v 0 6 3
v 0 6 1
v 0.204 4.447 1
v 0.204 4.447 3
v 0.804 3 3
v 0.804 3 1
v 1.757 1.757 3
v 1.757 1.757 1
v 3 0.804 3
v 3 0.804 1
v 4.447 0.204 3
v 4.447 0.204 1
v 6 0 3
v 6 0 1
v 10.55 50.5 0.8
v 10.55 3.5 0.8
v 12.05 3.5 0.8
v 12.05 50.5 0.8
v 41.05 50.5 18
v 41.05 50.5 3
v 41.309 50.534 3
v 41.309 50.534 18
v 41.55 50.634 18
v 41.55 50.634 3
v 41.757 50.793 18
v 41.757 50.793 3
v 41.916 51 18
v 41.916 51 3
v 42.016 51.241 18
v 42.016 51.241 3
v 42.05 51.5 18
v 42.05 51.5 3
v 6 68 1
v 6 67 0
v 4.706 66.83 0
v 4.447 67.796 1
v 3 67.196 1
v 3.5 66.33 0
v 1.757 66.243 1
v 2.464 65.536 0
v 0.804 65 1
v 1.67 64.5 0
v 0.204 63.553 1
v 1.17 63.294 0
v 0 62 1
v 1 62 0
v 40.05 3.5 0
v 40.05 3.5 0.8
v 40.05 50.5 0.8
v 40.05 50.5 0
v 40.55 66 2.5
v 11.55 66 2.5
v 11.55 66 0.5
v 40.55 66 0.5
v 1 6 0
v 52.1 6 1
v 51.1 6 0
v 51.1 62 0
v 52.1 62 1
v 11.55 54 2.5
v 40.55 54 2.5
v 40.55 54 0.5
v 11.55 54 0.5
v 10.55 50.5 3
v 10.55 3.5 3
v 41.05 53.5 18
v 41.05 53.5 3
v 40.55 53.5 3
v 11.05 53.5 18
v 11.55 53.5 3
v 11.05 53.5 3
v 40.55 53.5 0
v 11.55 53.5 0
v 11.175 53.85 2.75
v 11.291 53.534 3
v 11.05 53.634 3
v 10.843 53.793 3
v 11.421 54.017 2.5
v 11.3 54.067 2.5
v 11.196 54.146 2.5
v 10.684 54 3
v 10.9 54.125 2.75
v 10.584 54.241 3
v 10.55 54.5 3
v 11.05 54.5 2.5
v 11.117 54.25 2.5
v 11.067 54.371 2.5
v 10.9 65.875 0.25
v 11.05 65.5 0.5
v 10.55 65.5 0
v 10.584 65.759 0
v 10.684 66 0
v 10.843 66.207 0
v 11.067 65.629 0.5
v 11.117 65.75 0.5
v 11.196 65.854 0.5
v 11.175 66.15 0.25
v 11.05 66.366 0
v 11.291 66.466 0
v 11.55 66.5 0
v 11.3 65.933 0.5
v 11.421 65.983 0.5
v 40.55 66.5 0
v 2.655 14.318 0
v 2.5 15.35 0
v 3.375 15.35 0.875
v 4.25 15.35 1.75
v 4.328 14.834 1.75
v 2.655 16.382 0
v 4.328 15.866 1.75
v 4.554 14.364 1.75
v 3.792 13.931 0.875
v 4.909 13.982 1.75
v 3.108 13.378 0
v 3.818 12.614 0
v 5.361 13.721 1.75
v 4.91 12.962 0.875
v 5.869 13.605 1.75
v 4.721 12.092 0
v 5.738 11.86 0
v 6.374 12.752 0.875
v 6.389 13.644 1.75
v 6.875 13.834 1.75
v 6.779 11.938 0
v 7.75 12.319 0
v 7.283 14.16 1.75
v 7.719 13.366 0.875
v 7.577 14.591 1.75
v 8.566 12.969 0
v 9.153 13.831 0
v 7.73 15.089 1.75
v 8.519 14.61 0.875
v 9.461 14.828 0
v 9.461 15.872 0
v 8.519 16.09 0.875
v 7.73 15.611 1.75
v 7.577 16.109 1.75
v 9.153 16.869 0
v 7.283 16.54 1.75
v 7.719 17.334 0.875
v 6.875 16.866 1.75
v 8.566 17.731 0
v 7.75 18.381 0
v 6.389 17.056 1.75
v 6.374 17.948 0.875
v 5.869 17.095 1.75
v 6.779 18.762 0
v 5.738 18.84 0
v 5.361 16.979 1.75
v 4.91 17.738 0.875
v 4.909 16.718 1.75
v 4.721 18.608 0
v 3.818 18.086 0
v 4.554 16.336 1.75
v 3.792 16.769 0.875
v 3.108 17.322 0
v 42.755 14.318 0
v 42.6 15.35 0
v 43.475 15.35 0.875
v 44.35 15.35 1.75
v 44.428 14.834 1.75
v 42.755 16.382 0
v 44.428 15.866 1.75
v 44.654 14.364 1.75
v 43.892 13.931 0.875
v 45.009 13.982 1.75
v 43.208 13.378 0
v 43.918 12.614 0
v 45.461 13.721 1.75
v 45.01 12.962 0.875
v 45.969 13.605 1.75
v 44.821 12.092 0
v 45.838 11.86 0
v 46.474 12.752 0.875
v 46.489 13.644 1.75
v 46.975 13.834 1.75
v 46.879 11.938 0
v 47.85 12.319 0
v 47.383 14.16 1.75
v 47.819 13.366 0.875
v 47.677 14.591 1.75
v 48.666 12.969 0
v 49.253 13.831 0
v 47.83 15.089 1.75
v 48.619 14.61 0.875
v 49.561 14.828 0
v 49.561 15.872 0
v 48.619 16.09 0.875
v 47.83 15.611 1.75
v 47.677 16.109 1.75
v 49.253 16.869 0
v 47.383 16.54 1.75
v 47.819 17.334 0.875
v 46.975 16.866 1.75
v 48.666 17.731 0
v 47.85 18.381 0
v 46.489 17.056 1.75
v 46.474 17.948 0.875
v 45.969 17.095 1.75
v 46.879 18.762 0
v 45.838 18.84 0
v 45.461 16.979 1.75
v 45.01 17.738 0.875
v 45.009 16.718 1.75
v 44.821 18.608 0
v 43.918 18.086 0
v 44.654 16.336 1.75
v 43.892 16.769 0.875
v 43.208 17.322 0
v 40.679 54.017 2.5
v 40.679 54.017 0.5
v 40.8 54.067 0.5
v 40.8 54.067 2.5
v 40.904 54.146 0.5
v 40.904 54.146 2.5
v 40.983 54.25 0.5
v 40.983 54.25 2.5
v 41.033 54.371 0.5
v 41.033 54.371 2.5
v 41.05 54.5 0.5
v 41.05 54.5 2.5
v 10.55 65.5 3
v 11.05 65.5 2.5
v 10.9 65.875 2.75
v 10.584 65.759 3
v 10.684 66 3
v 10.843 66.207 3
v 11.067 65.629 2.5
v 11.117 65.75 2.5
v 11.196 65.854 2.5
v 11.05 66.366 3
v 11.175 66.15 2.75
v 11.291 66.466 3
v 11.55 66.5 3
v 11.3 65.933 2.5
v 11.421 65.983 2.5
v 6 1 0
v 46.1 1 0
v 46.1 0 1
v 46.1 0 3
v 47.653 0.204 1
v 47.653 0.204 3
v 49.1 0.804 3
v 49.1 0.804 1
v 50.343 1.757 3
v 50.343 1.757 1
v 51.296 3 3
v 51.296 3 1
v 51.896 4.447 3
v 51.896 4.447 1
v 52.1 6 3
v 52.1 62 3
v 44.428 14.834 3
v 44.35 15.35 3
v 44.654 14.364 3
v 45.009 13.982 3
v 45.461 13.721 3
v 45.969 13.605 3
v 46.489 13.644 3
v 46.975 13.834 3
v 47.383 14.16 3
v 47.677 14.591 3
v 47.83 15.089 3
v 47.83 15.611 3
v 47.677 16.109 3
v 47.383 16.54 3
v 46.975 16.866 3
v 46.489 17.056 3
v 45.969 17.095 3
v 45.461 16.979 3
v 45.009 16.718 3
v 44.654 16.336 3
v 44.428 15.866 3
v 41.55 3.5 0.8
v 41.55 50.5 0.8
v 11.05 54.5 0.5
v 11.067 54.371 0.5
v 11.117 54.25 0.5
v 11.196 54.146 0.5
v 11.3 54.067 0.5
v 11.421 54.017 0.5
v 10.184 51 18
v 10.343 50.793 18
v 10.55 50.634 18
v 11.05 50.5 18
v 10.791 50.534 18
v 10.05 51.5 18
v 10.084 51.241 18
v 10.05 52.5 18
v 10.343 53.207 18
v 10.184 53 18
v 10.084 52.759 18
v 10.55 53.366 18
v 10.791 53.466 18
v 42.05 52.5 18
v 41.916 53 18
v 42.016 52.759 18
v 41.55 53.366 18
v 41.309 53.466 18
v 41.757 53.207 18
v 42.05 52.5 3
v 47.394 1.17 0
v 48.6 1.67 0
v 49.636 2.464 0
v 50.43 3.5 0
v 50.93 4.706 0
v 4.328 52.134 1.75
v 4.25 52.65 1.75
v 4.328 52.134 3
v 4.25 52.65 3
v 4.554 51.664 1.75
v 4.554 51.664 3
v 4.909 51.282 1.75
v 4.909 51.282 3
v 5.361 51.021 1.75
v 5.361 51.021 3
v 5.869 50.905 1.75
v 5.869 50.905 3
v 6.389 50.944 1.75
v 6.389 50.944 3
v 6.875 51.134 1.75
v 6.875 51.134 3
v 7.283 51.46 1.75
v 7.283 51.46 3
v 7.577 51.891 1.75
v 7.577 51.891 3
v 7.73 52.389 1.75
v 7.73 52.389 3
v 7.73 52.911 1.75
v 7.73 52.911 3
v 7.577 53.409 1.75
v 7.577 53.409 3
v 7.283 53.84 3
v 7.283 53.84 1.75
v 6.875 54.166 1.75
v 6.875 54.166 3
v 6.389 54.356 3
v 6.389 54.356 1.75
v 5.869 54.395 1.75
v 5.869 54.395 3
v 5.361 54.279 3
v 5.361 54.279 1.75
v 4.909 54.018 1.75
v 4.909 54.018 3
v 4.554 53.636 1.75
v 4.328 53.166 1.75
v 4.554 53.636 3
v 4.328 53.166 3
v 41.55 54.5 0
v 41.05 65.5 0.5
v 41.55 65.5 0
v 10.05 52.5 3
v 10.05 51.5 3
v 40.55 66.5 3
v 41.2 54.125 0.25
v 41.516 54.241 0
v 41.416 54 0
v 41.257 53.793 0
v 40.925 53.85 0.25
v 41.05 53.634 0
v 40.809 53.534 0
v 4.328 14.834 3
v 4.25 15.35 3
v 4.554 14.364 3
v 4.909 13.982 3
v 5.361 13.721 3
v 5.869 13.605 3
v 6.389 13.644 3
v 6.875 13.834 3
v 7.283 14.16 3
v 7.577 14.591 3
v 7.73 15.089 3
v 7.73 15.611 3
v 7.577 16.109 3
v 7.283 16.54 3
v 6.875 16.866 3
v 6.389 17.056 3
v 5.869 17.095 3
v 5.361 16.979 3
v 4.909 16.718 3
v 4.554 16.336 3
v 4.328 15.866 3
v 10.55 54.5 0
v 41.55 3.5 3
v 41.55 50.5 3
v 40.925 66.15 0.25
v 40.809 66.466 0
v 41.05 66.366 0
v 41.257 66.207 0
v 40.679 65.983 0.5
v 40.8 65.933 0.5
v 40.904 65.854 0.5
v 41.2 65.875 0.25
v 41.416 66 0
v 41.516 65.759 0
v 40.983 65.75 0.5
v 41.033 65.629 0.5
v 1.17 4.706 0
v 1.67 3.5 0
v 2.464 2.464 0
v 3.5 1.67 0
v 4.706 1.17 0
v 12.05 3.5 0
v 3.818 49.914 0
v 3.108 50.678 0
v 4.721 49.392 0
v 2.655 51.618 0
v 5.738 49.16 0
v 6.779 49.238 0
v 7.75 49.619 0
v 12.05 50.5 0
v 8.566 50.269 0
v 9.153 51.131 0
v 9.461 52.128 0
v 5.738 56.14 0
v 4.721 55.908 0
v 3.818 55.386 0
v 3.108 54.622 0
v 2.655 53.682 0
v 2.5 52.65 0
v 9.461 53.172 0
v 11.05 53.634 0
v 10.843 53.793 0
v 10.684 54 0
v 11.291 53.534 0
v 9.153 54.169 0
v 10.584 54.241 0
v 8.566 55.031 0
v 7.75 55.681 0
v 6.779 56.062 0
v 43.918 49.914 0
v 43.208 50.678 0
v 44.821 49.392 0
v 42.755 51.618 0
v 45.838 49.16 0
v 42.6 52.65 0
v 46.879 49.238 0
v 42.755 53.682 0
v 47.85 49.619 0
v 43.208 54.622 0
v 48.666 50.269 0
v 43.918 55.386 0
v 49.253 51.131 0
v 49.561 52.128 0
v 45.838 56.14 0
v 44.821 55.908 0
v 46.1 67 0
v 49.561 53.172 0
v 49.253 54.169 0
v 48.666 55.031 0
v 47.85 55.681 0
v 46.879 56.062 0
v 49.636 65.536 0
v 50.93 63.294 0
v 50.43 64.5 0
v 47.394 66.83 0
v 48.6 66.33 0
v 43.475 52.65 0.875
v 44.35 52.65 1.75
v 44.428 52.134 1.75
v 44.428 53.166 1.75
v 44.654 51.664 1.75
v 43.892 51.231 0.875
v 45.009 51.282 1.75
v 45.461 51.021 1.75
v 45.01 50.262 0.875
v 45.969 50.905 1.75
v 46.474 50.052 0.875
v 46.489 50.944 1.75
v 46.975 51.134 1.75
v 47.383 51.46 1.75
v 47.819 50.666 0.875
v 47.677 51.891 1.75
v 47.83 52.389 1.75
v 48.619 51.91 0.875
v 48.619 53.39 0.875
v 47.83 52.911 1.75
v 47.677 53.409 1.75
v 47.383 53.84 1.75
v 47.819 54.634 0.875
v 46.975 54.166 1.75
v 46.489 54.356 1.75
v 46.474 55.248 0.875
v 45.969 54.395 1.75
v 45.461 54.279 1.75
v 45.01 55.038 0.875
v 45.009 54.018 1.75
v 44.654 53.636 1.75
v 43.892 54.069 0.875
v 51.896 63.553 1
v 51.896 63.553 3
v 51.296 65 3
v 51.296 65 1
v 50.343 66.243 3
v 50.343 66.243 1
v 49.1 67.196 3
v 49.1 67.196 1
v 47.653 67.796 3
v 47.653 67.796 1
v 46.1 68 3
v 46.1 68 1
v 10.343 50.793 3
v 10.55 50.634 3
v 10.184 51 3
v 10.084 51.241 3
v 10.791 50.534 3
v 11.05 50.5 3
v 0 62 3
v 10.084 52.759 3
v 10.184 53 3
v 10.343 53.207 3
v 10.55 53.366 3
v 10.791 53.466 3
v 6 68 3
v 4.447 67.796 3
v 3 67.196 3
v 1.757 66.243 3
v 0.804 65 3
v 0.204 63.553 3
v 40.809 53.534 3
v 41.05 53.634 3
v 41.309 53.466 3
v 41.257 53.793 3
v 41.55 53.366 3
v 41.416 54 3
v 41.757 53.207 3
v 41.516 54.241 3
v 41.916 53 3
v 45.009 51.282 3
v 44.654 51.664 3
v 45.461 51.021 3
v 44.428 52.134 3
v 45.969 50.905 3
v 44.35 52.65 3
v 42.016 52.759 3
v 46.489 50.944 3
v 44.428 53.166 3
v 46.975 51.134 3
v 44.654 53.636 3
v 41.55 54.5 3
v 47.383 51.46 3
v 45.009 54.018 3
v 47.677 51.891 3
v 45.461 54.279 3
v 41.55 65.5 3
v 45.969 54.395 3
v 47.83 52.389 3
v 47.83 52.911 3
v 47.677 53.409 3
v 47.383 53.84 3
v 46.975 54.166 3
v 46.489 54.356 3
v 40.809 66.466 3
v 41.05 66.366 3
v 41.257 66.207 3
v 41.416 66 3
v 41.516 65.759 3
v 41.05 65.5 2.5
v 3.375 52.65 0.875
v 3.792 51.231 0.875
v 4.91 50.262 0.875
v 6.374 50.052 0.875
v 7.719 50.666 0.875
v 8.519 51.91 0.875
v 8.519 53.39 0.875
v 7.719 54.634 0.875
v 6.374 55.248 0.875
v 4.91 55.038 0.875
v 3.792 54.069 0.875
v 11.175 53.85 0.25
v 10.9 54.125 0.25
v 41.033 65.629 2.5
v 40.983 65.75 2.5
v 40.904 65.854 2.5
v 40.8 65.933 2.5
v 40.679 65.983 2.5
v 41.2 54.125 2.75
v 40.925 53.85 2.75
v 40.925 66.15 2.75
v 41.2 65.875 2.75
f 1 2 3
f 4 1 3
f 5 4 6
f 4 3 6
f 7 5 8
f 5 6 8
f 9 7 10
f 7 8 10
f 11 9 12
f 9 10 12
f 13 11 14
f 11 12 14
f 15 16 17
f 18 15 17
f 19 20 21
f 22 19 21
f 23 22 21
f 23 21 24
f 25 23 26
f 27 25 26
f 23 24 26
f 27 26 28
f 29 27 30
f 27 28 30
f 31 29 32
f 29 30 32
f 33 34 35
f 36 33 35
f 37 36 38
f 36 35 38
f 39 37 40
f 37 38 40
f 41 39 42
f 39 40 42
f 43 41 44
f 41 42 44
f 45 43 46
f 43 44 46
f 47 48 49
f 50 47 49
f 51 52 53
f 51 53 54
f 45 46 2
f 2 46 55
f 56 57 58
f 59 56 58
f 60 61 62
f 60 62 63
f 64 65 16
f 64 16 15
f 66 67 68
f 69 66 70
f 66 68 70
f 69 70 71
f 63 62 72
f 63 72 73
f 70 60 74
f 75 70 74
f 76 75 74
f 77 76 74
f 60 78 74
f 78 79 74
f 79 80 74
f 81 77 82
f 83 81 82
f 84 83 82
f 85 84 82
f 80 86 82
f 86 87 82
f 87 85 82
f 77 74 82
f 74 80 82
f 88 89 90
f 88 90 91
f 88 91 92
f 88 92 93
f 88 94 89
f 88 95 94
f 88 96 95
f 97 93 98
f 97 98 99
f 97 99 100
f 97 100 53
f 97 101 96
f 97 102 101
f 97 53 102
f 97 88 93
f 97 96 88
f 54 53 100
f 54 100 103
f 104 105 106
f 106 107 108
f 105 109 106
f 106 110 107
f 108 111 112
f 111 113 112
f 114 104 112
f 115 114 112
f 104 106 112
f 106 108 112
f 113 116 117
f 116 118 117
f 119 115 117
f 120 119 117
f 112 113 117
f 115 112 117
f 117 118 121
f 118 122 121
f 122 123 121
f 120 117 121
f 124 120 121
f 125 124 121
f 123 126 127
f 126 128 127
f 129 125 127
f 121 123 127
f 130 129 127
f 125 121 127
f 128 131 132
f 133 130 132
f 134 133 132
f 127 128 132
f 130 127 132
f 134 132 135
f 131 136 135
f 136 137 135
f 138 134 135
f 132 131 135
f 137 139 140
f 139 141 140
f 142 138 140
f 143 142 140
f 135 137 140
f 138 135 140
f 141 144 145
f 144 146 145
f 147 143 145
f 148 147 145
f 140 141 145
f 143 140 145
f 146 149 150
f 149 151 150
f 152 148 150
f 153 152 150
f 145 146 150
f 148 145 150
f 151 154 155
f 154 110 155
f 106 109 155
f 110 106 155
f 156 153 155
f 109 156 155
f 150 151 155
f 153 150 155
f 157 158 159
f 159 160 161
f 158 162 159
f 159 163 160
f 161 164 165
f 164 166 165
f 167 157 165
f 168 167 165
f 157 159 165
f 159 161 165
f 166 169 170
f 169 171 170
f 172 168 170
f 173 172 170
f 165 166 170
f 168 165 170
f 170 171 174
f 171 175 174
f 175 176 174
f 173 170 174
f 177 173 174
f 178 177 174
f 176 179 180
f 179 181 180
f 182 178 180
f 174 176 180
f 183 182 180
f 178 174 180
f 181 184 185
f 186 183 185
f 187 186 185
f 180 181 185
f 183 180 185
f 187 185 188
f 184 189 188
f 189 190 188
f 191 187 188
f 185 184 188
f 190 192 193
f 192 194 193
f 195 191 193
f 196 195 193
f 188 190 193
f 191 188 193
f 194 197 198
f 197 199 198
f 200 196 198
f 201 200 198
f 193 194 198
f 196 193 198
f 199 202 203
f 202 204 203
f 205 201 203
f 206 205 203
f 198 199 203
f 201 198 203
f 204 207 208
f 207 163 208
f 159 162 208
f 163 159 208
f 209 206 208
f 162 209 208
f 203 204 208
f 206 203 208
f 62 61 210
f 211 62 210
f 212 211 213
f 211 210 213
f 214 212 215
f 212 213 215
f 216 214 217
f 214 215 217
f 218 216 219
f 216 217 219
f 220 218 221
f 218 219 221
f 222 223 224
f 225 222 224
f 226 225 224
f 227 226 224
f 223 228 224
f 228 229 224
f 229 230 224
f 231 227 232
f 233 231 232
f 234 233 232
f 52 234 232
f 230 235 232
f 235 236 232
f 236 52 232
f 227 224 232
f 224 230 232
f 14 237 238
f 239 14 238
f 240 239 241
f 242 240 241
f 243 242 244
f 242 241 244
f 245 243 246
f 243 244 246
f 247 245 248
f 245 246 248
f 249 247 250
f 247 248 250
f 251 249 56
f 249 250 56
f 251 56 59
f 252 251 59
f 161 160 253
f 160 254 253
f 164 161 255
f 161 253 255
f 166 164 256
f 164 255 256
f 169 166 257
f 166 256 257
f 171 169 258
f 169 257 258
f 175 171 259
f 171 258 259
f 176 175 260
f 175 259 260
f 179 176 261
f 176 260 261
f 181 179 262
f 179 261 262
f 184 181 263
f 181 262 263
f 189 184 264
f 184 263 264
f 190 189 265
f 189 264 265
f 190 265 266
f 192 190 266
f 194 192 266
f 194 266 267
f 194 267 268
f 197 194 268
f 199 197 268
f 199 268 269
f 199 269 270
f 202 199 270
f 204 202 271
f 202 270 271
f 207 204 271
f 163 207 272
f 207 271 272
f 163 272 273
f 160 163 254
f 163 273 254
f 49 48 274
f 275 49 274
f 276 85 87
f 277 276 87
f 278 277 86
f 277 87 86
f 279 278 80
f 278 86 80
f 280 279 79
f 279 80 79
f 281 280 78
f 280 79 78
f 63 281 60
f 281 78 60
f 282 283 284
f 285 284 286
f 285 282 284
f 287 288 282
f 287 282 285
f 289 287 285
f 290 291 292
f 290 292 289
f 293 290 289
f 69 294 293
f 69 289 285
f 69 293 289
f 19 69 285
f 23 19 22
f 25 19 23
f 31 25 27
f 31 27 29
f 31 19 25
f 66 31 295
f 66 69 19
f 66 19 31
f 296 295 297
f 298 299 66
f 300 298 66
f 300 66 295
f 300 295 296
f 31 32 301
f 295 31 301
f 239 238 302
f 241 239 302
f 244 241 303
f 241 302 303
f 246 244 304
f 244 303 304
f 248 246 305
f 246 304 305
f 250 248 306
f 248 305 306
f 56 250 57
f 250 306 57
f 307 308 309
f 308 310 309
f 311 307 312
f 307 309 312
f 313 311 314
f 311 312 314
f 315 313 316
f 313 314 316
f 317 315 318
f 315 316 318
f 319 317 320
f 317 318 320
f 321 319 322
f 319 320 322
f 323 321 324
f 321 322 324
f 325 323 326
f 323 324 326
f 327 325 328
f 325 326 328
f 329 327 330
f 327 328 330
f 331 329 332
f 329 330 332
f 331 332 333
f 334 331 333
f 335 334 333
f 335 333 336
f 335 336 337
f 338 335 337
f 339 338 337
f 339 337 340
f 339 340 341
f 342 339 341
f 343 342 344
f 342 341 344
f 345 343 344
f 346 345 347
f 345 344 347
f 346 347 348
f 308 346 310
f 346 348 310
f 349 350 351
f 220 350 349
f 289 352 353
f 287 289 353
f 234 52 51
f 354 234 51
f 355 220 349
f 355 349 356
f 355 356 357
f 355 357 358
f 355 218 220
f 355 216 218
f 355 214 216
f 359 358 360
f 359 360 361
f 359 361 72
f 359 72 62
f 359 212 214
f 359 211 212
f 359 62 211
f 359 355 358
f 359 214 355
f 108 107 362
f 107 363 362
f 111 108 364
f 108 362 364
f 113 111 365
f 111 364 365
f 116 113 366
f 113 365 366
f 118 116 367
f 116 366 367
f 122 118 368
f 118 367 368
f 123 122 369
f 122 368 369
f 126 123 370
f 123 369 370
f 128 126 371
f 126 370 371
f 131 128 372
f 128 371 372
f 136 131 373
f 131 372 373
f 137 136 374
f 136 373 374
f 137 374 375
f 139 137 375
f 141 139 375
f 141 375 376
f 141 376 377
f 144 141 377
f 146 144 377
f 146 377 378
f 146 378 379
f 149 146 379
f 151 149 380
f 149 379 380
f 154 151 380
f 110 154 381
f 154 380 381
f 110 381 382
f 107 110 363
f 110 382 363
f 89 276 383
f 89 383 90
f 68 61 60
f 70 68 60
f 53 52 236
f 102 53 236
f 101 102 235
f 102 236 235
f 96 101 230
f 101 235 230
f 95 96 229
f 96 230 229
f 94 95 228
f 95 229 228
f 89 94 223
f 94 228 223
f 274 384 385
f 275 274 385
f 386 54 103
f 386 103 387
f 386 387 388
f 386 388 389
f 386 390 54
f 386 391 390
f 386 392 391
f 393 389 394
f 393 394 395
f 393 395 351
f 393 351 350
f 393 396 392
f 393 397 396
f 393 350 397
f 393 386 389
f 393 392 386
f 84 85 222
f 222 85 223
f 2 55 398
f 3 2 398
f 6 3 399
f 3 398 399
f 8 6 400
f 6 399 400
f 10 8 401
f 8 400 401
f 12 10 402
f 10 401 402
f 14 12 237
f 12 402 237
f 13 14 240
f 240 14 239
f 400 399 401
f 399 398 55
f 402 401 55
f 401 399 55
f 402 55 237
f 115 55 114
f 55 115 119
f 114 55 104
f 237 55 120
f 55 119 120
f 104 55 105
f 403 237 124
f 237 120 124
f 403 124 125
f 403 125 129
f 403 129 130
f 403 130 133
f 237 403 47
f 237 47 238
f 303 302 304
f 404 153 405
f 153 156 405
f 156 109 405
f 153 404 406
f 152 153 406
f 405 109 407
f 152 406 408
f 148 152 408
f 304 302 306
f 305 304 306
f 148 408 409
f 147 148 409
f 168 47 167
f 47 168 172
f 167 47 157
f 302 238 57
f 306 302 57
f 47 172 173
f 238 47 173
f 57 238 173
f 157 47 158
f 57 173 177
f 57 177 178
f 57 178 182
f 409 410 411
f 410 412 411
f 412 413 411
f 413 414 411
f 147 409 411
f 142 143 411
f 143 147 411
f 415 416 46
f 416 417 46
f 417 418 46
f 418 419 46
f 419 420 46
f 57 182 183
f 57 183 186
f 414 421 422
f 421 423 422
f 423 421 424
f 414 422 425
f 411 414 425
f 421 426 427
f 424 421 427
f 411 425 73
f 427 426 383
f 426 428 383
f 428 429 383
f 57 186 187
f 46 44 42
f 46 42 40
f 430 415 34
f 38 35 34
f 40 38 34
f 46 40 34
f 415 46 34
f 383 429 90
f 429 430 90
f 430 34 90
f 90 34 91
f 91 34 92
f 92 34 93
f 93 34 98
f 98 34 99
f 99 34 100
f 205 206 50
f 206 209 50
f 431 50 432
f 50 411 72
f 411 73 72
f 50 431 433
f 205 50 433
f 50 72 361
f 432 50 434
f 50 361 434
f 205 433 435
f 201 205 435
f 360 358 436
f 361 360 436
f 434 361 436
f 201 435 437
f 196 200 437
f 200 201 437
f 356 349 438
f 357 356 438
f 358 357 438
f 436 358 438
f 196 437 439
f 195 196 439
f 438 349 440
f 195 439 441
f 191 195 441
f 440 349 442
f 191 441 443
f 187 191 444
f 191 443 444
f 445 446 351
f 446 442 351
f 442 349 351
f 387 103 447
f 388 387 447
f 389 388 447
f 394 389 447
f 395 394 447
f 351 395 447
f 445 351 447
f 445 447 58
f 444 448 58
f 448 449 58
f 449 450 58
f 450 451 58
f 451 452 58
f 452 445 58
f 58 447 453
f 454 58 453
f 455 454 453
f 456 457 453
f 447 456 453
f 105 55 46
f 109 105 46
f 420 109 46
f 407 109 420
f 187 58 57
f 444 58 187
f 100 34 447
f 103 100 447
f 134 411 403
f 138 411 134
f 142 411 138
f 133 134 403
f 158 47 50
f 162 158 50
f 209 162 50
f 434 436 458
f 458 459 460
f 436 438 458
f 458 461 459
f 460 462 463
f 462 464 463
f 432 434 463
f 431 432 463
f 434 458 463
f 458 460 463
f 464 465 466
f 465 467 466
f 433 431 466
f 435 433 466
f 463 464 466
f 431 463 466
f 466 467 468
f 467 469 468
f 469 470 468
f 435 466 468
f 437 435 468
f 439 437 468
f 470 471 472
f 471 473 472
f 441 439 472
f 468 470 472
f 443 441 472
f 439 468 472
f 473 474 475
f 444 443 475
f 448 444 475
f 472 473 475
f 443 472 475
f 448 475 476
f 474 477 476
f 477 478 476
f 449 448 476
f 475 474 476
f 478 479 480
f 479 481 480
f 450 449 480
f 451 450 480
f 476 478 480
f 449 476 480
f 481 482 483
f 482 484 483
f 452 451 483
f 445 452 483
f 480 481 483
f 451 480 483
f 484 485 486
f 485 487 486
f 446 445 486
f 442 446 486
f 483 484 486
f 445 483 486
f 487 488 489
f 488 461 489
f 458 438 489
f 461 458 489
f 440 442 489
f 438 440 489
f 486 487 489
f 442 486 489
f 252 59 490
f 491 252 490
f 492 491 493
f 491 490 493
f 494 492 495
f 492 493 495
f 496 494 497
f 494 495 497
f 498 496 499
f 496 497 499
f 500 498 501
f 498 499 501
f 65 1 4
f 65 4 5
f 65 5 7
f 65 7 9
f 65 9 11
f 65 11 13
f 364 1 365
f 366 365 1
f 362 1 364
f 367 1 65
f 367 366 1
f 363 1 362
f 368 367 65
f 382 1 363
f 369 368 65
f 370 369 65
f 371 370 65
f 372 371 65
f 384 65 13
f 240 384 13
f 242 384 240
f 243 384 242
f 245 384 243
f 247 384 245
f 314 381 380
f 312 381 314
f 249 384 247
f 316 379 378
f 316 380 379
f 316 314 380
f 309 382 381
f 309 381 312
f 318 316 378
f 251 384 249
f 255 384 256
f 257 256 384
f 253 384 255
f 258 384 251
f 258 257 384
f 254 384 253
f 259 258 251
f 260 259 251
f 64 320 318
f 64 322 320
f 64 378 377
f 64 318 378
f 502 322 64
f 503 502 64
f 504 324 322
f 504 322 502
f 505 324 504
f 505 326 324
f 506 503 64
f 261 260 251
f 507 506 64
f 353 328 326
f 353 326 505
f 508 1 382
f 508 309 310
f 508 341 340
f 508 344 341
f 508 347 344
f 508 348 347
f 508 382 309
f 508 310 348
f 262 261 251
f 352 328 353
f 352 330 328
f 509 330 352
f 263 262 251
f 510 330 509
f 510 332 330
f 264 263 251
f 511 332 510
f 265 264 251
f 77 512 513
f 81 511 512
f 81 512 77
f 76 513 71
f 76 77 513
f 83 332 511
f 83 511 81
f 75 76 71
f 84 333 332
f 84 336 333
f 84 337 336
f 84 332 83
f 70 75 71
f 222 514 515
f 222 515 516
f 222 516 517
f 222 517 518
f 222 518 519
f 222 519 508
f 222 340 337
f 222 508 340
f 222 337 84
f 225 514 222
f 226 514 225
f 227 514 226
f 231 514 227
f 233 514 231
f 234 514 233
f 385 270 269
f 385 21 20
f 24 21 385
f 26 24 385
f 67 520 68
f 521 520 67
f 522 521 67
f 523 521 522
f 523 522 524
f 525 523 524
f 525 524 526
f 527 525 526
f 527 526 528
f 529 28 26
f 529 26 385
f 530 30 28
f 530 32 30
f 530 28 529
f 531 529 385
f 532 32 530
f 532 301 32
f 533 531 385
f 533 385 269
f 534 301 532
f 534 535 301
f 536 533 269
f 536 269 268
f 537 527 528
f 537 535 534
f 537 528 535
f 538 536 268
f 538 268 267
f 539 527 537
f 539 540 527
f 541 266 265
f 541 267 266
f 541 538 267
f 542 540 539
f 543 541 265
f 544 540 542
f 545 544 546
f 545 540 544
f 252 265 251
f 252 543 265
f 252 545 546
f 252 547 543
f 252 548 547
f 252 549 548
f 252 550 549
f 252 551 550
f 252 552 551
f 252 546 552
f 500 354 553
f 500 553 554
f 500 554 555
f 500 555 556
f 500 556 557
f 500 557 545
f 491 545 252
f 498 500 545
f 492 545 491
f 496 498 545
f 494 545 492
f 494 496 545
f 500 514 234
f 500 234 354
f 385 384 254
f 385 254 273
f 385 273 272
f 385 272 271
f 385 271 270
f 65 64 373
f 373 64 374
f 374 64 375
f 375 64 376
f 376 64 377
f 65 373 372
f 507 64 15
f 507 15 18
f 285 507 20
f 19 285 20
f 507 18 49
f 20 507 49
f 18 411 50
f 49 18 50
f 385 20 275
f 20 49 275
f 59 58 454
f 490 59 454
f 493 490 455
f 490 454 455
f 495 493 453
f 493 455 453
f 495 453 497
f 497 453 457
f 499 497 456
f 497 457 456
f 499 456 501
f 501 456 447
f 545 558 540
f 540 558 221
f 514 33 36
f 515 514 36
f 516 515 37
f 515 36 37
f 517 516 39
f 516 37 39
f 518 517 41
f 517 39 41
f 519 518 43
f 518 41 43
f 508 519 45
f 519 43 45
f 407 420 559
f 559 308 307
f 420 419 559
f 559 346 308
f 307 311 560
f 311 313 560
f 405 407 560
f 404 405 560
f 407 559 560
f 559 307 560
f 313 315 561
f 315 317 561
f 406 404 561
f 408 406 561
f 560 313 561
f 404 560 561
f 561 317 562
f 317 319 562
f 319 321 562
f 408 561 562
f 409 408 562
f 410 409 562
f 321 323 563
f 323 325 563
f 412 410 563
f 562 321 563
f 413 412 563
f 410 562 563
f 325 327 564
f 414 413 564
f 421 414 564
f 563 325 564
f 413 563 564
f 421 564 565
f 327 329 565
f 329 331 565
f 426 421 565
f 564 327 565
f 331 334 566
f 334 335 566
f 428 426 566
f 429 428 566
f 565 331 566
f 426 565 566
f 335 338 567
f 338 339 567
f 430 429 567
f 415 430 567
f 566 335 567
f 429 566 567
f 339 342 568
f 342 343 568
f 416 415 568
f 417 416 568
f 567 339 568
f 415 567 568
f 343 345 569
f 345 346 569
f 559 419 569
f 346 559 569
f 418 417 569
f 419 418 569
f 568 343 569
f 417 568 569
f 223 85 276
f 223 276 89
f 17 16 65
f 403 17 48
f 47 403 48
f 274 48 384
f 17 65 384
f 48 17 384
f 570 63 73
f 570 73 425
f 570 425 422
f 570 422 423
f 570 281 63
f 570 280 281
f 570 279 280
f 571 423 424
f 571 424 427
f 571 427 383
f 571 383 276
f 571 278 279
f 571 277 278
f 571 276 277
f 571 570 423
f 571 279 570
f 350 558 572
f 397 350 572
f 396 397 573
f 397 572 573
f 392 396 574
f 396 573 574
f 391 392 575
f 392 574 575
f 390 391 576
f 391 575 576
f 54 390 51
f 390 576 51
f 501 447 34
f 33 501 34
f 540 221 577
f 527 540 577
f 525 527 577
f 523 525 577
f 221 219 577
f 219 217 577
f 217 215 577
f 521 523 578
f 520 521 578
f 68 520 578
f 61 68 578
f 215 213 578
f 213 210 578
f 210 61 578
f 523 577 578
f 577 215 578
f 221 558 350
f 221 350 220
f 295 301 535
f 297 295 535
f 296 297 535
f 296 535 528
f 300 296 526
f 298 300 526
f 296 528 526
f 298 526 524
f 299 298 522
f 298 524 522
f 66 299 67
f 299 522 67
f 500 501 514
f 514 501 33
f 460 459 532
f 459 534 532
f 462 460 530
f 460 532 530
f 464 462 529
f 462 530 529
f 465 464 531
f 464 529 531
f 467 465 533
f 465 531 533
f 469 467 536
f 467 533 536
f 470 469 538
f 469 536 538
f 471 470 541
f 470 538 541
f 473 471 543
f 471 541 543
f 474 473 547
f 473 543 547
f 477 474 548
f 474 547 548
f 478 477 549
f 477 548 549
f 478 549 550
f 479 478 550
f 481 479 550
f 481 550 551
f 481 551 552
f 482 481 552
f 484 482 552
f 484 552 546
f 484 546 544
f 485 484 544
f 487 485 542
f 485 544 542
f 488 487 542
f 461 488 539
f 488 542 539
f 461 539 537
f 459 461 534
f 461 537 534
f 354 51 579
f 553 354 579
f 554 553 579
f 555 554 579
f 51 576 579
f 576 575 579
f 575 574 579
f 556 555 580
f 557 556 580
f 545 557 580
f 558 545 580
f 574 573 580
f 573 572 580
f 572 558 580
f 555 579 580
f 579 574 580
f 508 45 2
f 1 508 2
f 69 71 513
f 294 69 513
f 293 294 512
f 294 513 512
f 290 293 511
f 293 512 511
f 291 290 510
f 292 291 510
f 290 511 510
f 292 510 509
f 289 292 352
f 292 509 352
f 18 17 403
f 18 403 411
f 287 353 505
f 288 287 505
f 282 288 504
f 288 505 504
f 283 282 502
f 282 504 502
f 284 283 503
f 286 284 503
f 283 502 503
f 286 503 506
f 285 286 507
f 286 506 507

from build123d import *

# Parameters (mm, degrees)
PAD_DEPTH        = 3
HOLE_D           = 3.5
HOLE_CSINK_D     = 7
HOLE_CSINK_ANGLE = 90
CHAMFER_SIZE     = 1
SKETCH002_W      = 31
SKETCH002_H      = 47
POCKET_DEPTH     = 2.2
SKETCH003_W      = 28
SKETCH003_H      = 47
POCKET001_DEPTH  = 3.001
POCKET002_DEPTH  = 3.001
CHAMFER001_SIZE  = 0.5
PAD001_DEPTH     = 15


with BuildPart() as part:
    # Sketch → Pad (new body)
    with BuildSketch(Plane.XY):
        with BuildLine():
            Line((6, 0), (46.1, 0))
            ThreePointArc((46.1, 0), (50.342641, 1.757359), (52.1, 6))
            Line((52.1, 6), (52.1, 62))
            ThreePointArc((52.1, 62), (50.342641, 66.242641), (46.1, 68))
            Line((46.1, 68), (6, 68))
            ThreePointArc((6, 68), (1.757359, 66.242641), (0, 62))
            Line((0, 62), (0, 6))
            ThreePointArc((0, 6), (1.757359, 1.757359), (6, 0))
        make_face()
    extrude(amount=PAD_DEPTH)

    # Hole (through all)
    with Locations(Plane(origin=(0, 0, 0), x_dir=(1, 0, 0), z_dir=(0, 0, -1))):
        with Locations((6, -52.65), (46.1, -52.65), (46.1, -15.35), (6, -15.35)):
            CounterSinkHole(HOLE_D / 2, HOLE_CSINK_D / 2, counter_sink_angle=HOLE_CSINK_ANGLE)

    # Chamfer
    chamfer_edges = [part.edges().sort_by_distance(p)[0] for p in [
        (52.1, 34, 0),
    ]]
    chamfer(chamfer_edges, length=CHAMFER_SIZE)

    # Sketch002 (on DatumPlane) → Pocket (cut)
    with BuildSketch(Plane.XY.offset(3)):
        with Locations((26.05, 27)):
            Rectangle(SKETCH002_W, SKETCH002_H)
    extrude(amount=-POCKET_DEPTH, mode=Mode.SUBTRACT)

    # Sketch003 (on DatumPlane) → Pocket001 (cut, through all)
    with BuildSketch(Plane.XY.offset(3)):
        with Locations((26.05, 27)):
            Rectangle(SKETCH003_W, SKETCH003_H)
    extrude(amount=-POCKET001_DEPTH, mode=Mode.SUBTRACT)

    # Sketch004 (on DatumPlane) → Pocket002 (cut, through all)
    with BuildSketch(Plane.XY.offset(3)):
        with BuildLine():
            Line((11.05, 54.5), (11.05, 65.5))
            ThreePointArc((11.55, 66), (11.196447, 65.853553), (11.05, 65.5))
            Line((11.55, 66), (40.55, 66))
            ThreePointArc((41.05, 65.5), (40.903553, 65.853553), (40.55, 66))
            Line((41.05, 65.5), (41.05, 54.5))
            ThreePointArc((40.55, 54), (40.903553, 54.146447), (41.05, 54.5))
            Line((40.55, 54), (11.55, 54))
            ThreePointArc((11.05, 54.5), (11.196447, 54.146447), (11.55, 54))
        make_face()
    extrude(amount=-POCKET002_DEPTH, mode=Mode.SUBTRACT)

    # Chamfer001
    chamfer001_edges = [part.edges().sort_by_distance(p)[0] for p in [
        (26.05, 54, 0),
        (26.05, 54, 3),
    ]]
    chamfer(chamfer001_edges, length=CHAMFER001_SIZE)

    # Sketch005 (on DatumPlane) → Pad001 (join)
    with BuildSketch(Plane.XY.offset(3)):
        with BuildLine():
            Line((10.05, 52.5), (10.05, 51.5))
            ThreePointArc((10.05, 51.5), (10.342893, 50.792893), (11.05, 50.5))
            Line((11.05, 50.5), (41.05, 50.5))
            ThreePointArc((41.05, 50.5), (41.757107, 50.792893), (42.05, 51.5))
            Line((42.05, 51.5), (42.05, 52.5))
            ThreePointArc((42.05, 52.5), (41.757107, 53.207107), (41.05, 53.5))
            Line((41.05, 53.5), (11.05, 53.5))
            ThreePointArc((11.05, 53.5), (10.342893, 53.207107), (10.05, 52.5))
        make_face()
    extrude(amount=PAD001_DEPTH)


solid = part.part
